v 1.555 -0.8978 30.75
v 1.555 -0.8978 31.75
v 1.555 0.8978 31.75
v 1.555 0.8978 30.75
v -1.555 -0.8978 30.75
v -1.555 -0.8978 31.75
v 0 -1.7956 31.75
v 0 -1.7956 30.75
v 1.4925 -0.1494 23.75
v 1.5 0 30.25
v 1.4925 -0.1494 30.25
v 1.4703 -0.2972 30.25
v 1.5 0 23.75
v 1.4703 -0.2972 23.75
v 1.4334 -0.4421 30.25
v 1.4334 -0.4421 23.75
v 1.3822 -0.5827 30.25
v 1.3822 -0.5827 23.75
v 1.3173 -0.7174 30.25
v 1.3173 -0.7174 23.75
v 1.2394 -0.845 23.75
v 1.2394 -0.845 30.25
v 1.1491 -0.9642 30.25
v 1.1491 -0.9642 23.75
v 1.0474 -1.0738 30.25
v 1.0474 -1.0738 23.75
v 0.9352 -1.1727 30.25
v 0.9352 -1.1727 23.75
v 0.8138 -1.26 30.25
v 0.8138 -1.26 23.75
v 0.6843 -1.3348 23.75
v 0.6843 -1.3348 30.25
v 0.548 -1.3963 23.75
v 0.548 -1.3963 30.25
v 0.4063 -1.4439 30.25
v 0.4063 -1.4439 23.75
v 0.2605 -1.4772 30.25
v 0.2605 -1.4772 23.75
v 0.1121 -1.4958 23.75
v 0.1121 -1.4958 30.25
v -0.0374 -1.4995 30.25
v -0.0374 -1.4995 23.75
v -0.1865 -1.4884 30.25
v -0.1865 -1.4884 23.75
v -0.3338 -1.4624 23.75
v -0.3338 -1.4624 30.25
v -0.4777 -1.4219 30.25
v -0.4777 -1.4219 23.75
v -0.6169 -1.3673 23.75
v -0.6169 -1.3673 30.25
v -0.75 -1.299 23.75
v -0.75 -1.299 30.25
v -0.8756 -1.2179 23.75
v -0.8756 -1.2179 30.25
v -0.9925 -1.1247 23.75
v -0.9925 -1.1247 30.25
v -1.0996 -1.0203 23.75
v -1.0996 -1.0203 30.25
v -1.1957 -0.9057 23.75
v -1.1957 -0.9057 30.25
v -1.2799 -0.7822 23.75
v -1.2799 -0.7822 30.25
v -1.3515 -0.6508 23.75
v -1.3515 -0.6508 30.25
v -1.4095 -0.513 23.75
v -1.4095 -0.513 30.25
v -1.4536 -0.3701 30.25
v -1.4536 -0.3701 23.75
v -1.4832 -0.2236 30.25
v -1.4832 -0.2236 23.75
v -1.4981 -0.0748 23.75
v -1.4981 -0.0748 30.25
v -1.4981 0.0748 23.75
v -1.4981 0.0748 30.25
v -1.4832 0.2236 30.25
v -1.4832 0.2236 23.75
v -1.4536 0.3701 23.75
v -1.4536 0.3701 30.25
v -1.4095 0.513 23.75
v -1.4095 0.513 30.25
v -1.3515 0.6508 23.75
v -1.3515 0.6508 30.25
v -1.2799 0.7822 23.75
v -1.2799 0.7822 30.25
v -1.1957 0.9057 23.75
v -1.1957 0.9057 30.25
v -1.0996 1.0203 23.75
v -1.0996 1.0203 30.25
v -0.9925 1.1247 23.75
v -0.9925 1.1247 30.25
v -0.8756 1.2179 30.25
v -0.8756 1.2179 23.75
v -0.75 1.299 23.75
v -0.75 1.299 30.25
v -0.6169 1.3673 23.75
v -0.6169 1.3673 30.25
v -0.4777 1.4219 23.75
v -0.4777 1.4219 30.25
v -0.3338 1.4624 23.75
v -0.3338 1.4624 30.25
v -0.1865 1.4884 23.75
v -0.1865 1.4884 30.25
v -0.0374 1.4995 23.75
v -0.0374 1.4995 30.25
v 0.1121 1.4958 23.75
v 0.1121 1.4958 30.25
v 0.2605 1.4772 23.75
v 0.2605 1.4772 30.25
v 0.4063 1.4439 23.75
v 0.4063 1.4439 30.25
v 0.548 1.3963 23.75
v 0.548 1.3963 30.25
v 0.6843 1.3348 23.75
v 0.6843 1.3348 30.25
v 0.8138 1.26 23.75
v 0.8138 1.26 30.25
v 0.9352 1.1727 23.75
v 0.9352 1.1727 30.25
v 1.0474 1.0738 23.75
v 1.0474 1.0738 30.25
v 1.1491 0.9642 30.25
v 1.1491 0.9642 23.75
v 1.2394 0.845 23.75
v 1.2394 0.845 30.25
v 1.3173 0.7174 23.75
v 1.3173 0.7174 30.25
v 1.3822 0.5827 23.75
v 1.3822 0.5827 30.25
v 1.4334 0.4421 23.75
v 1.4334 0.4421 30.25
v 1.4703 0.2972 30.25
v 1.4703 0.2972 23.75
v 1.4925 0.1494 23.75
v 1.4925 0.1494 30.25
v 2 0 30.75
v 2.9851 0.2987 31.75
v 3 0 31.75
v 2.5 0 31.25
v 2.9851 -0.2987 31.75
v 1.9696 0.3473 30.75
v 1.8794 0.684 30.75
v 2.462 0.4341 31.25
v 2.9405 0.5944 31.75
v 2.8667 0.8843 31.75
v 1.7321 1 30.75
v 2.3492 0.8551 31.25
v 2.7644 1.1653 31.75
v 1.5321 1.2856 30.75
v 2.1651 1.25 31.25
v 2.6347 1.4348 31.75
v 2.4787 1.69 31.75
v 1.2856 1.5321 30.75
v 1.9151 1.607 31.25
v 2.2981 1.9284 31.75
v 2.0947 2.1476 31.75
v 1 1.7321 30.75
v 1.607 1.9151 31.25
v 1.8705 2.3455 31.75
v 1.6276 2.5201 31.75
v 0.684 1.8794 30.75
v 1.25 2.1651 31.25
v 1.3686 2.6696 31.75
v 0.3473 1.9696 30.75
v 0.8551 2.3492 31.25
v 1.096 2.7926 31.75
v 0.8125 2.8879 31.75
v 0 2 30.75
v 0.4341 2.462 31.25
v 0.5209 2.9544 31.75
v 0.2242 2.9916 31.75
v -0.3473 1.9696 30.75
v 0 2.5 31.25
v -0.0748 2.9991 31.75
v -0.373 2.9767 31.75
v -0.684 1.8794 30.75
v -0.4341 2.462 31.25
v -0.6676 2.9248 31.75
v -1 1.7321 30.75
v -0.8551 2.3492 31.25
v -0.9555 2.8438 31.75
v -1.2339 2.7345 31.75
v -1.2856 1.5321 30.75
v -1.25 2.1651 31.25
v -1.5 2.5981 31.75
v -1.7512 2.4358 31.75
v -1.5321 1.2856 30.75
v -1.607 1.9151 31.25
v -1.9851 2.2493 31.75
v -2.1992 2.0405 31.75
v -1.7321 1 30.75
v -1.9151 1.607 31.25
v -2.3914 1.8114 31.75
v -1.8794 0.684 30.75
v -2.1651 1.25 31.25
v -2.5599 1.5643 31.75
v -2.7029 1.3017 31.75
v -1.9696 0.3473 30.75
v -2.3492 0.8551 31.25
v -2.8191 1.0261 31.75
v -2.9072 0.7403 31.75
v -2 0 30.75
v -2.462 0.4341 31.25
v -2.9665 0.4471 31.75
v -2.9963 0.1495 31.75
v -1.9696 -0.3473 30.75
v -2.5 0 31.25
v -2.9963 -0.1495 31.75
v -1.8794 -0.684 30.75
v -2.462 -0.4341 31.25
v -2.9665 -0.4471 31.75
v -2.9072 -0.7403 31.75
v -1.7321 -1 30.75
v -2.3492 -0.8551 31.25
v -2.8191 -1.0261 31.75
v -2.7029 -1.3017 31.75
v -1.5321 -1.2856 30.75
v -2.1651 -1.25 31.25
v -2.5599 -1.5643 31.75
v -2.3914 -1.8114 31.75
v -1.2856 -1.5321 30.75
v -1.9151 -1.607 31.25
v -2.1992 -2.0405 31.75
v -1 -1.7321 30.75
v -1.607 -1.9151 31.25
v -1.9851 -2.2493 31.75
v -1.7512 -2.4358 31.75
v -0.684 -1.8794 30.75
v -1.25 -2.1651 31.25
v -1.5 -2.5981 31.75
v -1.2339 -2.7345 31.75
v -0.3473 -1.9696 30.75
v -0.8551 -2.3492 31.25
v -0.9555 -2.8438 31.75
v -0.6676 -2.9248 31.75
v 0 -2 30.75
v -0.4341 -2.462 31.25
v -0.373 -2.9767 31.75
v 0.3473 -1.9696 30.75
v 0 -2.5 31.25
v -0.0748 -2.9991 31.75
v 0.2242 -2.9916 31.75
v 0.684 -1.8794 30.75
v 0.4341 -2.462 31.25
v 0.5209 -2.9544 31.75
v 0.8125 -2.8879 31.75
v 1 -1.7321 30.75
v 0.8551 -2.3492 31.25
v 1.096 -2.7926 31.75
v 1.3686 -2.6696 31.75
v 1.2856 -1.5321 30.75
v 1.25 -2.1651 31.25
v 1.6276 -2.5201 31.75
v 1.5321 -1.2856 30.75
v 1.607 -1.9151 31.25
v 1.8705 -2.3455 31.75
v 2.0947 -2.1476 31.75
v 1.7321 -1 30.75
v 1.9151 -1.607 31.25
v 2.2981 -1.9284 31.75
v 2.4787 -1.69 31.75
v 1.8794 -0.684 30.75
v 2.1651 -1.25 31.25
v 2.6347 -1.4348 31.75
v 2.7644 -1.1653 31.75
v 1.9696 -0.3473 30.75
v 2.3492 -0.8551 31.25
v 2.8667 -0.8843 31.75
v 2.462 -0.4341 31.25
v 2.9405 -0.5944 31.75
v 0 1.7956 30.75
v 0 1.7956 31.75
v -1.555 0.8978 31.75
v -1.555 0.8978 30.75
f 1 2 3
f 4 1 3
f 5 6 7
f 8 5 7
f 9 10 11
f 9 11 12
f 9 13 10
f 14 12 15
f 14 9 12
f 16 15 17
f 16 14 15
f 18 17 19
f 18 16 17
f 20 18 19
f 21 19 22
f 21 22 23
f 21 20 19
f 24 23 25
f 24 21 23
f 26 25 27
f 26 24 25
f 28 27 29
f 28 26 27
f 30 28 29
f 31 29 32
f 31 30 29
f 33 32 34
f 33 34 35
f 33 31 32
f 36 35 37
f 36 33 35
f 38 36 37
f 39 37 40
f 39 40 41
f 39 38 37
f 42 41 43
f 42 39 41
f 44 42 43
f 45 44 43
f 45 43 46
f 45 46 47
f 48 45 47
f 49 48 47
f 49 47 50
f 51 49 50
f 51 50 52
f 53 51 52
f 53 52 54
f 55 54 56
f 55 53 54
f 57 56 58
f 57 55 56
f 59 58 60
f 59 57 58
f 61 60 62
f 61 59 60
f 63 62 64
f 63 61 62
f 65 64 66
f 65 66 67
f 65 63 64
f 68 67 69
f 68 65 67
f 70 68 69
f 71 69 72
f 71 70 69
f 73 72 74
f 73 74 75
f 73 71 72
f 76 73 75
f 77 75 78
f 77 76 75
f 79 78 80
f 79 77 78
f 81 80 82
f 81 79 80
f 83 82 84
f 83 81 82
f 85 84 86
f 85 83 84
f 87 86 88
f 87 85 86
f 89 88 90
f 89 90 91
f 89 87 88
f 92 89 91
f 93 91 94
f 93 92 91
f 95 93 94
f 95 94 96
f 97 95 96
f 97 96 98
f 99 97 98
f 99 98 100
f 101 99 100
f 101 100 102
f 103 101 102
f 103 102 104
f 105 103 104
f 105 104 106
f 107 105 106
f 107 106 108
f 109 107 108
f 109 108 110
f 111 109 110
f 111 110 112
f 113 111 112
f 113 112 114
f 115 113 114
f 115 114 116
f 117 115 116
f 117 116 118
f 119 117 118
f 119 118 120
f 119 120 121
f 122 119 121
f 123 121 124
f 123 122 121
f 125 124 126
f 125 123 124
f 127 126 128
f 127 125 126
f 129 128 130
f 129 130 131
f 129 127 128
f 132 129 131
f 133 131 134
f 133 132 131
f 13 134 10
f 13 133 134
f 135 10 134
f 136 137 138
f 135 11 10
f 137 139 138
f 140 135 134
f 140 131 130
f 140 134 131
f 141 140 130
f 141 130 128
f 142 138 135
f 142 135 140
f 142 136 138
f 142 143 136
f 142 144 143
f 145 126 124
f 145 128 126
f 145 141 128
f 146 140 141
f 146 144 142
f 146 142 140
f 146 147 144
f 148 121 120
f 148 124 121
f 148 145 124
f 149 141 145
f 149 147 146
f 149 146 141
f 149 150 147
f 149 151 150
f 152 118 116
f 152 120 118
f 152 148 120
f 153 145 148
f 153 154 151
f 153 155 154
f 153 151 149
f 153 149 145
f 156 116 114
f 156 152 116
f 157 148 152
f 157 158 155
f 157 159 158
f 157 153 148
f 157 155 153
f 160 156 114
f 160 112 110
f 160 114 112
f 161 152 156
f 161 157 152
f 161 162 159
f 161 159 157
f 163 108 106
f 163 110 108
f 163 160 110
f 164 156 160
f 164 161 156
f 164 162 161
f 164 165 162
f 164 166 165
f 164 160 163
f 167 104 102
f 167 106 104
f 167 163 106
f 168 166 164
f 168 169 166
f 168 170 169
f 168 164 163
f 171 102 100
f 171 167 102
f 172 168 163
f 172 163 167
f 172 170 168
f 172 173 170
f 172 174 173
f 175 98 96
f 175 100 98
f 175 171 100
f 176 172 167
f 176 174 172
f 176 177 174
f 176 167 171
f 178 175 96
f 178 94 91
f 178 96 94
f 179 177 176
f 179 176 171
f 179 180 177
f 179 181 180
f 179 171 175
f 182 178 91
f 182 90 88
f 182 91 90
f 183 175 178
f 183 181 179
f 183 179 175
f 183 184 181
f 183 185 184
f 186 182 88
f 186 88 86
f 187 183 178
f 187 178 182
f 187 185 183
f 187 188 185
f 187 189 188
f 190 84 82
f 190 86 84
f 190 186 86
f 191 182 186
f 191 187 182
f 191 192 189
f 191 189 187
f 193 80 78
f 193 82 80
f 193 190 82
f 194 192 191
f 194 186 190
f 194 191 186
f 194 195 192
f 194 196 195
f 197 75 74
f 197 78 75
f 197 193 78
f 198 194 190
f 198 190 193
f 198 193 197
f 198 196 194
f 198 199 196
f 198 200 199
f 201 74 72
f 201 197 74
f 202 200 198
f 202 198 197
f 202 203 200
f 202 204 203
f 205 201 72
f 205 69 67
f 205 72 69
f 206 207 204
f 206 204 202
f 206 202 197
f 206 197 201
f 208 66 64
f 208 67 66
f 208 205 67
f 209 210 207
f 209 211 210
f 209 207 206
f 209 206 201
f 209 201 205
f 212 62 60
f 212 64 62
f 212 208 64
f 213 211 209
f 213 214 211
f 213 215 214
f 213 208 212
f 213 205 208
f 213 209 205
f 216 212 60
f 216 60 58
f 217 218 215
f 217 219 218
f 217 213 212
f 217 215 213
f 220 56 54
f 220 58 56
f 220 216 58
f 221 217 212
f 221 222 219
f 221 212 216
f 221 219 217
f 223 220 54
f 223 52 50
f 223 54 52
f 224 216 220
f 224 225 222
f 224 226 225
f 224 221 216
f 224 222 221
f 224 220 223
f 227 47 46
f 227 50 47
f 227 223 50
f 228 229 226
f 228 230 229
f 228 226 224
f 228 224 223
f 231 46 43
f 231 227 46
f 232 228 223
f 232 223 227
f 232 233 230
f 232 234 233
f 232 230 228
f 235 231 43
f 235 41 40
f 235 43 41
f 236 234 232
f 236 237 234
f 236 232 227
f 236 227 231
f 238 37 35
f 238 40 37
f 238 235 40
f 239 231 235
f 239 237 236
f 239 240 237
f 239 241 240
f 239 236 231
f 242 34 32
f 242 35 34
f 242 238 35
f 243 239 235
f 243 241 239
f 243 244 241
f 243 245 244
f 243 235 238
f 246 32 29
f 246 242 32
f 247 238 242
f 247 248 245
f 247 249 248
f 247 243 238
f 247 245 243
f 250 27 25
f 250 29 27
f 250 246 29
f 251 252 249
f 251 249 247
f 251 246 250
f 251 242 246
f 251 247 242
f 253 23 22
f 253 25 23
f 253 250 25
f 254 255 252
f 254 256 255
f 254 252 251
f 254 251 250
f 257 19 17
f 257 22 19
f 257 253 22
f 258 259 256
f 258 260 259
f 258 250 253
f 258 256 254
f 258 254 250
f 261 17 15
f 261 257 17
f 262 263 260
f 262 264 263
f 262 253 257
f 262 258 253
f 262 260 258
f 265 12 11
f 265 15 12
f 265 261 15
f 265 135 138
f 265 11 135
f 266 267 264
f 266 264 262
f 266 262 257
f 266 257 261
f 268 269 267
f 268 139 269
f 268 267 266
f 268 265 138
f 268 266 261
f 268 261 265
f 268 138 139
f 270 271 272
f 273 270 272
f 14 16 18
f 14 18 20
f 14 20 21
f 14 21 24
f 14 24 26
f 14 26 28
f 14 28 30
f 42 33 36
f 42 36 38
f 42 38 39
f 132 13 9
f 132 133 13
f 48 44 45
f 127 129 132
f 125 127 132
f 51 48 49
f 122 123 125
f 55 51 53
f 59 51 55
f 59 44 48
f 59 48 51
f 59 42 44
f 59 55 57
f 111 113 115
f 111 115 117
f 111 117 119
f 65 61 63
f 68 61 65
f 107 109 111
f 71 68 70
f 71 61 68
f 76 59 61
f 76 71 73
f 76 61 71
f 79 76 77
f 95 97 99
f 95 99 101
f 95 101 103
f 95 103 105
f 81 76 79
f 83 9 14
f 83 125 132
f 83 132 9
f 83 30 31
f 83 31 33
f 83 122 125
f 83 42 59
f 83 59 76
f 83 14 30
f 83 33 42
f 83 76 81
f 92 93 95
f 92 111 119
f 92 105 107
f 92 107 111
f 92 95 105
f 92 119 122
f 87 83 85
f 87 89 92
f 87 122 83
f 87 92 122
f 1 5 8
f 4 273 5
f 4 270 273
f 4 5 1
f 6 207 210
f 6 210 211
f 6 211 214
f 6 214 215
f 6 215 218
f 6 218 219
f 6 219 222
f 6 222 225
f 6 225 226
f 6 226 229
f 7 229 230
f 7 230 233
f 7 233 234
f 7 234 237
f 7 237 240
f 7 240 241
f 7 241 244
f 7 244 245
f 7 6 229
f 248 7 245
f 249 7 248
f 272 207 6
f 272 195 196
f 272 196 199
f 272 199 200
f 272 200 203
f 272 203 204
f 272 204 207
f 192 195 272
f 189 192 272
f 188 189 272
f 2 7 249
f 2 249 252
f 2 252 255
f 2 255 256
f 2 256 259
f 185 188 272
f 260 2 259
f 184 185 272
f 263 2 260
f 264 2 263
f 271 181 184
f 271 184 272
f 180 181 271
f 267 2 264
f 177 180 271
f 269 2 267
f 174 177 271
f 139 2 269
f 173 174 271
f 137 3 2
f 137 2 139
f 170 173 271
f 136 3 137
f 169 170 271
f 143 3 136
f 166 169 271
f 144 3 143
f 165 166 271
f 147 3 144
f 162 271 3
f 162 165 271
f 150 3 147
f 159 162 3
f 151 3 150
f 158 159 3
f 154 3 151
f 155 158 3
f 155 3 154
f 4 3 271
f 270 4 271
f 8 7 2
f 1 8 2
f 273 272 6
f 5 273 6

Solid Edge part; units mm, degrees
sketch "Sketch1" plane through (0, 0, 0) normal (0, 0, 1) x (1, 0, 0)
  circle A0 centre (0, 0) radius 1.5
extrude "Protrusion1" add sketch "Sketch1" along normal blind 30
sketch "Sketch2" plane through (0, 0, 30) normal (0, 0, 1) x (1, 0, 0)
  circle A0 centre (0, 0) radius 3
extrude "ExtrudedProtrusion_2" add sketch "Sketch2" along normal blind 1.75
chamfer "Chamfer_1" distance 1.75 angle 45 1 edges at (-3, 0, 30)
sketch "Sketch3" plane through (0, 0, 31.75) normal (0, 0, 1) x (0, 1, 0)
  line L0 (0.8978, -1.555) -> (1.7956, 0)
  line L1 (1.7956, 0) -> (0.8978, 1.555)
  line L2 (0.8978, 1.555) -> (-0.8978, 1.555)
  line L3 (-0.8978, 1.555) -> (-1.7956, 0)
  line L4 (-1.7956, 0) -> (-0.8978, -1.555)
  line L5 (-0.8978, -1.555) -> (0.8978, -1.555)
extrude "ExtrudedCutout_1" cut sketch "Sketch3" against normal blind 1
sketch "Sketch4" plane through (0, 0, 0) normal (0, 0, -1) x (0, 1, 0)
  circle A0 centre (0, 0) radius 1.9215
extrude "ExtrudedCutout_2" cut sketch "Sketch4" against normal blind 23.75
revolve "RevolvedCutout1" [suppressed]
fillet "Round_1" [suppressed]
properties material "Iron, grey cast type 20"
